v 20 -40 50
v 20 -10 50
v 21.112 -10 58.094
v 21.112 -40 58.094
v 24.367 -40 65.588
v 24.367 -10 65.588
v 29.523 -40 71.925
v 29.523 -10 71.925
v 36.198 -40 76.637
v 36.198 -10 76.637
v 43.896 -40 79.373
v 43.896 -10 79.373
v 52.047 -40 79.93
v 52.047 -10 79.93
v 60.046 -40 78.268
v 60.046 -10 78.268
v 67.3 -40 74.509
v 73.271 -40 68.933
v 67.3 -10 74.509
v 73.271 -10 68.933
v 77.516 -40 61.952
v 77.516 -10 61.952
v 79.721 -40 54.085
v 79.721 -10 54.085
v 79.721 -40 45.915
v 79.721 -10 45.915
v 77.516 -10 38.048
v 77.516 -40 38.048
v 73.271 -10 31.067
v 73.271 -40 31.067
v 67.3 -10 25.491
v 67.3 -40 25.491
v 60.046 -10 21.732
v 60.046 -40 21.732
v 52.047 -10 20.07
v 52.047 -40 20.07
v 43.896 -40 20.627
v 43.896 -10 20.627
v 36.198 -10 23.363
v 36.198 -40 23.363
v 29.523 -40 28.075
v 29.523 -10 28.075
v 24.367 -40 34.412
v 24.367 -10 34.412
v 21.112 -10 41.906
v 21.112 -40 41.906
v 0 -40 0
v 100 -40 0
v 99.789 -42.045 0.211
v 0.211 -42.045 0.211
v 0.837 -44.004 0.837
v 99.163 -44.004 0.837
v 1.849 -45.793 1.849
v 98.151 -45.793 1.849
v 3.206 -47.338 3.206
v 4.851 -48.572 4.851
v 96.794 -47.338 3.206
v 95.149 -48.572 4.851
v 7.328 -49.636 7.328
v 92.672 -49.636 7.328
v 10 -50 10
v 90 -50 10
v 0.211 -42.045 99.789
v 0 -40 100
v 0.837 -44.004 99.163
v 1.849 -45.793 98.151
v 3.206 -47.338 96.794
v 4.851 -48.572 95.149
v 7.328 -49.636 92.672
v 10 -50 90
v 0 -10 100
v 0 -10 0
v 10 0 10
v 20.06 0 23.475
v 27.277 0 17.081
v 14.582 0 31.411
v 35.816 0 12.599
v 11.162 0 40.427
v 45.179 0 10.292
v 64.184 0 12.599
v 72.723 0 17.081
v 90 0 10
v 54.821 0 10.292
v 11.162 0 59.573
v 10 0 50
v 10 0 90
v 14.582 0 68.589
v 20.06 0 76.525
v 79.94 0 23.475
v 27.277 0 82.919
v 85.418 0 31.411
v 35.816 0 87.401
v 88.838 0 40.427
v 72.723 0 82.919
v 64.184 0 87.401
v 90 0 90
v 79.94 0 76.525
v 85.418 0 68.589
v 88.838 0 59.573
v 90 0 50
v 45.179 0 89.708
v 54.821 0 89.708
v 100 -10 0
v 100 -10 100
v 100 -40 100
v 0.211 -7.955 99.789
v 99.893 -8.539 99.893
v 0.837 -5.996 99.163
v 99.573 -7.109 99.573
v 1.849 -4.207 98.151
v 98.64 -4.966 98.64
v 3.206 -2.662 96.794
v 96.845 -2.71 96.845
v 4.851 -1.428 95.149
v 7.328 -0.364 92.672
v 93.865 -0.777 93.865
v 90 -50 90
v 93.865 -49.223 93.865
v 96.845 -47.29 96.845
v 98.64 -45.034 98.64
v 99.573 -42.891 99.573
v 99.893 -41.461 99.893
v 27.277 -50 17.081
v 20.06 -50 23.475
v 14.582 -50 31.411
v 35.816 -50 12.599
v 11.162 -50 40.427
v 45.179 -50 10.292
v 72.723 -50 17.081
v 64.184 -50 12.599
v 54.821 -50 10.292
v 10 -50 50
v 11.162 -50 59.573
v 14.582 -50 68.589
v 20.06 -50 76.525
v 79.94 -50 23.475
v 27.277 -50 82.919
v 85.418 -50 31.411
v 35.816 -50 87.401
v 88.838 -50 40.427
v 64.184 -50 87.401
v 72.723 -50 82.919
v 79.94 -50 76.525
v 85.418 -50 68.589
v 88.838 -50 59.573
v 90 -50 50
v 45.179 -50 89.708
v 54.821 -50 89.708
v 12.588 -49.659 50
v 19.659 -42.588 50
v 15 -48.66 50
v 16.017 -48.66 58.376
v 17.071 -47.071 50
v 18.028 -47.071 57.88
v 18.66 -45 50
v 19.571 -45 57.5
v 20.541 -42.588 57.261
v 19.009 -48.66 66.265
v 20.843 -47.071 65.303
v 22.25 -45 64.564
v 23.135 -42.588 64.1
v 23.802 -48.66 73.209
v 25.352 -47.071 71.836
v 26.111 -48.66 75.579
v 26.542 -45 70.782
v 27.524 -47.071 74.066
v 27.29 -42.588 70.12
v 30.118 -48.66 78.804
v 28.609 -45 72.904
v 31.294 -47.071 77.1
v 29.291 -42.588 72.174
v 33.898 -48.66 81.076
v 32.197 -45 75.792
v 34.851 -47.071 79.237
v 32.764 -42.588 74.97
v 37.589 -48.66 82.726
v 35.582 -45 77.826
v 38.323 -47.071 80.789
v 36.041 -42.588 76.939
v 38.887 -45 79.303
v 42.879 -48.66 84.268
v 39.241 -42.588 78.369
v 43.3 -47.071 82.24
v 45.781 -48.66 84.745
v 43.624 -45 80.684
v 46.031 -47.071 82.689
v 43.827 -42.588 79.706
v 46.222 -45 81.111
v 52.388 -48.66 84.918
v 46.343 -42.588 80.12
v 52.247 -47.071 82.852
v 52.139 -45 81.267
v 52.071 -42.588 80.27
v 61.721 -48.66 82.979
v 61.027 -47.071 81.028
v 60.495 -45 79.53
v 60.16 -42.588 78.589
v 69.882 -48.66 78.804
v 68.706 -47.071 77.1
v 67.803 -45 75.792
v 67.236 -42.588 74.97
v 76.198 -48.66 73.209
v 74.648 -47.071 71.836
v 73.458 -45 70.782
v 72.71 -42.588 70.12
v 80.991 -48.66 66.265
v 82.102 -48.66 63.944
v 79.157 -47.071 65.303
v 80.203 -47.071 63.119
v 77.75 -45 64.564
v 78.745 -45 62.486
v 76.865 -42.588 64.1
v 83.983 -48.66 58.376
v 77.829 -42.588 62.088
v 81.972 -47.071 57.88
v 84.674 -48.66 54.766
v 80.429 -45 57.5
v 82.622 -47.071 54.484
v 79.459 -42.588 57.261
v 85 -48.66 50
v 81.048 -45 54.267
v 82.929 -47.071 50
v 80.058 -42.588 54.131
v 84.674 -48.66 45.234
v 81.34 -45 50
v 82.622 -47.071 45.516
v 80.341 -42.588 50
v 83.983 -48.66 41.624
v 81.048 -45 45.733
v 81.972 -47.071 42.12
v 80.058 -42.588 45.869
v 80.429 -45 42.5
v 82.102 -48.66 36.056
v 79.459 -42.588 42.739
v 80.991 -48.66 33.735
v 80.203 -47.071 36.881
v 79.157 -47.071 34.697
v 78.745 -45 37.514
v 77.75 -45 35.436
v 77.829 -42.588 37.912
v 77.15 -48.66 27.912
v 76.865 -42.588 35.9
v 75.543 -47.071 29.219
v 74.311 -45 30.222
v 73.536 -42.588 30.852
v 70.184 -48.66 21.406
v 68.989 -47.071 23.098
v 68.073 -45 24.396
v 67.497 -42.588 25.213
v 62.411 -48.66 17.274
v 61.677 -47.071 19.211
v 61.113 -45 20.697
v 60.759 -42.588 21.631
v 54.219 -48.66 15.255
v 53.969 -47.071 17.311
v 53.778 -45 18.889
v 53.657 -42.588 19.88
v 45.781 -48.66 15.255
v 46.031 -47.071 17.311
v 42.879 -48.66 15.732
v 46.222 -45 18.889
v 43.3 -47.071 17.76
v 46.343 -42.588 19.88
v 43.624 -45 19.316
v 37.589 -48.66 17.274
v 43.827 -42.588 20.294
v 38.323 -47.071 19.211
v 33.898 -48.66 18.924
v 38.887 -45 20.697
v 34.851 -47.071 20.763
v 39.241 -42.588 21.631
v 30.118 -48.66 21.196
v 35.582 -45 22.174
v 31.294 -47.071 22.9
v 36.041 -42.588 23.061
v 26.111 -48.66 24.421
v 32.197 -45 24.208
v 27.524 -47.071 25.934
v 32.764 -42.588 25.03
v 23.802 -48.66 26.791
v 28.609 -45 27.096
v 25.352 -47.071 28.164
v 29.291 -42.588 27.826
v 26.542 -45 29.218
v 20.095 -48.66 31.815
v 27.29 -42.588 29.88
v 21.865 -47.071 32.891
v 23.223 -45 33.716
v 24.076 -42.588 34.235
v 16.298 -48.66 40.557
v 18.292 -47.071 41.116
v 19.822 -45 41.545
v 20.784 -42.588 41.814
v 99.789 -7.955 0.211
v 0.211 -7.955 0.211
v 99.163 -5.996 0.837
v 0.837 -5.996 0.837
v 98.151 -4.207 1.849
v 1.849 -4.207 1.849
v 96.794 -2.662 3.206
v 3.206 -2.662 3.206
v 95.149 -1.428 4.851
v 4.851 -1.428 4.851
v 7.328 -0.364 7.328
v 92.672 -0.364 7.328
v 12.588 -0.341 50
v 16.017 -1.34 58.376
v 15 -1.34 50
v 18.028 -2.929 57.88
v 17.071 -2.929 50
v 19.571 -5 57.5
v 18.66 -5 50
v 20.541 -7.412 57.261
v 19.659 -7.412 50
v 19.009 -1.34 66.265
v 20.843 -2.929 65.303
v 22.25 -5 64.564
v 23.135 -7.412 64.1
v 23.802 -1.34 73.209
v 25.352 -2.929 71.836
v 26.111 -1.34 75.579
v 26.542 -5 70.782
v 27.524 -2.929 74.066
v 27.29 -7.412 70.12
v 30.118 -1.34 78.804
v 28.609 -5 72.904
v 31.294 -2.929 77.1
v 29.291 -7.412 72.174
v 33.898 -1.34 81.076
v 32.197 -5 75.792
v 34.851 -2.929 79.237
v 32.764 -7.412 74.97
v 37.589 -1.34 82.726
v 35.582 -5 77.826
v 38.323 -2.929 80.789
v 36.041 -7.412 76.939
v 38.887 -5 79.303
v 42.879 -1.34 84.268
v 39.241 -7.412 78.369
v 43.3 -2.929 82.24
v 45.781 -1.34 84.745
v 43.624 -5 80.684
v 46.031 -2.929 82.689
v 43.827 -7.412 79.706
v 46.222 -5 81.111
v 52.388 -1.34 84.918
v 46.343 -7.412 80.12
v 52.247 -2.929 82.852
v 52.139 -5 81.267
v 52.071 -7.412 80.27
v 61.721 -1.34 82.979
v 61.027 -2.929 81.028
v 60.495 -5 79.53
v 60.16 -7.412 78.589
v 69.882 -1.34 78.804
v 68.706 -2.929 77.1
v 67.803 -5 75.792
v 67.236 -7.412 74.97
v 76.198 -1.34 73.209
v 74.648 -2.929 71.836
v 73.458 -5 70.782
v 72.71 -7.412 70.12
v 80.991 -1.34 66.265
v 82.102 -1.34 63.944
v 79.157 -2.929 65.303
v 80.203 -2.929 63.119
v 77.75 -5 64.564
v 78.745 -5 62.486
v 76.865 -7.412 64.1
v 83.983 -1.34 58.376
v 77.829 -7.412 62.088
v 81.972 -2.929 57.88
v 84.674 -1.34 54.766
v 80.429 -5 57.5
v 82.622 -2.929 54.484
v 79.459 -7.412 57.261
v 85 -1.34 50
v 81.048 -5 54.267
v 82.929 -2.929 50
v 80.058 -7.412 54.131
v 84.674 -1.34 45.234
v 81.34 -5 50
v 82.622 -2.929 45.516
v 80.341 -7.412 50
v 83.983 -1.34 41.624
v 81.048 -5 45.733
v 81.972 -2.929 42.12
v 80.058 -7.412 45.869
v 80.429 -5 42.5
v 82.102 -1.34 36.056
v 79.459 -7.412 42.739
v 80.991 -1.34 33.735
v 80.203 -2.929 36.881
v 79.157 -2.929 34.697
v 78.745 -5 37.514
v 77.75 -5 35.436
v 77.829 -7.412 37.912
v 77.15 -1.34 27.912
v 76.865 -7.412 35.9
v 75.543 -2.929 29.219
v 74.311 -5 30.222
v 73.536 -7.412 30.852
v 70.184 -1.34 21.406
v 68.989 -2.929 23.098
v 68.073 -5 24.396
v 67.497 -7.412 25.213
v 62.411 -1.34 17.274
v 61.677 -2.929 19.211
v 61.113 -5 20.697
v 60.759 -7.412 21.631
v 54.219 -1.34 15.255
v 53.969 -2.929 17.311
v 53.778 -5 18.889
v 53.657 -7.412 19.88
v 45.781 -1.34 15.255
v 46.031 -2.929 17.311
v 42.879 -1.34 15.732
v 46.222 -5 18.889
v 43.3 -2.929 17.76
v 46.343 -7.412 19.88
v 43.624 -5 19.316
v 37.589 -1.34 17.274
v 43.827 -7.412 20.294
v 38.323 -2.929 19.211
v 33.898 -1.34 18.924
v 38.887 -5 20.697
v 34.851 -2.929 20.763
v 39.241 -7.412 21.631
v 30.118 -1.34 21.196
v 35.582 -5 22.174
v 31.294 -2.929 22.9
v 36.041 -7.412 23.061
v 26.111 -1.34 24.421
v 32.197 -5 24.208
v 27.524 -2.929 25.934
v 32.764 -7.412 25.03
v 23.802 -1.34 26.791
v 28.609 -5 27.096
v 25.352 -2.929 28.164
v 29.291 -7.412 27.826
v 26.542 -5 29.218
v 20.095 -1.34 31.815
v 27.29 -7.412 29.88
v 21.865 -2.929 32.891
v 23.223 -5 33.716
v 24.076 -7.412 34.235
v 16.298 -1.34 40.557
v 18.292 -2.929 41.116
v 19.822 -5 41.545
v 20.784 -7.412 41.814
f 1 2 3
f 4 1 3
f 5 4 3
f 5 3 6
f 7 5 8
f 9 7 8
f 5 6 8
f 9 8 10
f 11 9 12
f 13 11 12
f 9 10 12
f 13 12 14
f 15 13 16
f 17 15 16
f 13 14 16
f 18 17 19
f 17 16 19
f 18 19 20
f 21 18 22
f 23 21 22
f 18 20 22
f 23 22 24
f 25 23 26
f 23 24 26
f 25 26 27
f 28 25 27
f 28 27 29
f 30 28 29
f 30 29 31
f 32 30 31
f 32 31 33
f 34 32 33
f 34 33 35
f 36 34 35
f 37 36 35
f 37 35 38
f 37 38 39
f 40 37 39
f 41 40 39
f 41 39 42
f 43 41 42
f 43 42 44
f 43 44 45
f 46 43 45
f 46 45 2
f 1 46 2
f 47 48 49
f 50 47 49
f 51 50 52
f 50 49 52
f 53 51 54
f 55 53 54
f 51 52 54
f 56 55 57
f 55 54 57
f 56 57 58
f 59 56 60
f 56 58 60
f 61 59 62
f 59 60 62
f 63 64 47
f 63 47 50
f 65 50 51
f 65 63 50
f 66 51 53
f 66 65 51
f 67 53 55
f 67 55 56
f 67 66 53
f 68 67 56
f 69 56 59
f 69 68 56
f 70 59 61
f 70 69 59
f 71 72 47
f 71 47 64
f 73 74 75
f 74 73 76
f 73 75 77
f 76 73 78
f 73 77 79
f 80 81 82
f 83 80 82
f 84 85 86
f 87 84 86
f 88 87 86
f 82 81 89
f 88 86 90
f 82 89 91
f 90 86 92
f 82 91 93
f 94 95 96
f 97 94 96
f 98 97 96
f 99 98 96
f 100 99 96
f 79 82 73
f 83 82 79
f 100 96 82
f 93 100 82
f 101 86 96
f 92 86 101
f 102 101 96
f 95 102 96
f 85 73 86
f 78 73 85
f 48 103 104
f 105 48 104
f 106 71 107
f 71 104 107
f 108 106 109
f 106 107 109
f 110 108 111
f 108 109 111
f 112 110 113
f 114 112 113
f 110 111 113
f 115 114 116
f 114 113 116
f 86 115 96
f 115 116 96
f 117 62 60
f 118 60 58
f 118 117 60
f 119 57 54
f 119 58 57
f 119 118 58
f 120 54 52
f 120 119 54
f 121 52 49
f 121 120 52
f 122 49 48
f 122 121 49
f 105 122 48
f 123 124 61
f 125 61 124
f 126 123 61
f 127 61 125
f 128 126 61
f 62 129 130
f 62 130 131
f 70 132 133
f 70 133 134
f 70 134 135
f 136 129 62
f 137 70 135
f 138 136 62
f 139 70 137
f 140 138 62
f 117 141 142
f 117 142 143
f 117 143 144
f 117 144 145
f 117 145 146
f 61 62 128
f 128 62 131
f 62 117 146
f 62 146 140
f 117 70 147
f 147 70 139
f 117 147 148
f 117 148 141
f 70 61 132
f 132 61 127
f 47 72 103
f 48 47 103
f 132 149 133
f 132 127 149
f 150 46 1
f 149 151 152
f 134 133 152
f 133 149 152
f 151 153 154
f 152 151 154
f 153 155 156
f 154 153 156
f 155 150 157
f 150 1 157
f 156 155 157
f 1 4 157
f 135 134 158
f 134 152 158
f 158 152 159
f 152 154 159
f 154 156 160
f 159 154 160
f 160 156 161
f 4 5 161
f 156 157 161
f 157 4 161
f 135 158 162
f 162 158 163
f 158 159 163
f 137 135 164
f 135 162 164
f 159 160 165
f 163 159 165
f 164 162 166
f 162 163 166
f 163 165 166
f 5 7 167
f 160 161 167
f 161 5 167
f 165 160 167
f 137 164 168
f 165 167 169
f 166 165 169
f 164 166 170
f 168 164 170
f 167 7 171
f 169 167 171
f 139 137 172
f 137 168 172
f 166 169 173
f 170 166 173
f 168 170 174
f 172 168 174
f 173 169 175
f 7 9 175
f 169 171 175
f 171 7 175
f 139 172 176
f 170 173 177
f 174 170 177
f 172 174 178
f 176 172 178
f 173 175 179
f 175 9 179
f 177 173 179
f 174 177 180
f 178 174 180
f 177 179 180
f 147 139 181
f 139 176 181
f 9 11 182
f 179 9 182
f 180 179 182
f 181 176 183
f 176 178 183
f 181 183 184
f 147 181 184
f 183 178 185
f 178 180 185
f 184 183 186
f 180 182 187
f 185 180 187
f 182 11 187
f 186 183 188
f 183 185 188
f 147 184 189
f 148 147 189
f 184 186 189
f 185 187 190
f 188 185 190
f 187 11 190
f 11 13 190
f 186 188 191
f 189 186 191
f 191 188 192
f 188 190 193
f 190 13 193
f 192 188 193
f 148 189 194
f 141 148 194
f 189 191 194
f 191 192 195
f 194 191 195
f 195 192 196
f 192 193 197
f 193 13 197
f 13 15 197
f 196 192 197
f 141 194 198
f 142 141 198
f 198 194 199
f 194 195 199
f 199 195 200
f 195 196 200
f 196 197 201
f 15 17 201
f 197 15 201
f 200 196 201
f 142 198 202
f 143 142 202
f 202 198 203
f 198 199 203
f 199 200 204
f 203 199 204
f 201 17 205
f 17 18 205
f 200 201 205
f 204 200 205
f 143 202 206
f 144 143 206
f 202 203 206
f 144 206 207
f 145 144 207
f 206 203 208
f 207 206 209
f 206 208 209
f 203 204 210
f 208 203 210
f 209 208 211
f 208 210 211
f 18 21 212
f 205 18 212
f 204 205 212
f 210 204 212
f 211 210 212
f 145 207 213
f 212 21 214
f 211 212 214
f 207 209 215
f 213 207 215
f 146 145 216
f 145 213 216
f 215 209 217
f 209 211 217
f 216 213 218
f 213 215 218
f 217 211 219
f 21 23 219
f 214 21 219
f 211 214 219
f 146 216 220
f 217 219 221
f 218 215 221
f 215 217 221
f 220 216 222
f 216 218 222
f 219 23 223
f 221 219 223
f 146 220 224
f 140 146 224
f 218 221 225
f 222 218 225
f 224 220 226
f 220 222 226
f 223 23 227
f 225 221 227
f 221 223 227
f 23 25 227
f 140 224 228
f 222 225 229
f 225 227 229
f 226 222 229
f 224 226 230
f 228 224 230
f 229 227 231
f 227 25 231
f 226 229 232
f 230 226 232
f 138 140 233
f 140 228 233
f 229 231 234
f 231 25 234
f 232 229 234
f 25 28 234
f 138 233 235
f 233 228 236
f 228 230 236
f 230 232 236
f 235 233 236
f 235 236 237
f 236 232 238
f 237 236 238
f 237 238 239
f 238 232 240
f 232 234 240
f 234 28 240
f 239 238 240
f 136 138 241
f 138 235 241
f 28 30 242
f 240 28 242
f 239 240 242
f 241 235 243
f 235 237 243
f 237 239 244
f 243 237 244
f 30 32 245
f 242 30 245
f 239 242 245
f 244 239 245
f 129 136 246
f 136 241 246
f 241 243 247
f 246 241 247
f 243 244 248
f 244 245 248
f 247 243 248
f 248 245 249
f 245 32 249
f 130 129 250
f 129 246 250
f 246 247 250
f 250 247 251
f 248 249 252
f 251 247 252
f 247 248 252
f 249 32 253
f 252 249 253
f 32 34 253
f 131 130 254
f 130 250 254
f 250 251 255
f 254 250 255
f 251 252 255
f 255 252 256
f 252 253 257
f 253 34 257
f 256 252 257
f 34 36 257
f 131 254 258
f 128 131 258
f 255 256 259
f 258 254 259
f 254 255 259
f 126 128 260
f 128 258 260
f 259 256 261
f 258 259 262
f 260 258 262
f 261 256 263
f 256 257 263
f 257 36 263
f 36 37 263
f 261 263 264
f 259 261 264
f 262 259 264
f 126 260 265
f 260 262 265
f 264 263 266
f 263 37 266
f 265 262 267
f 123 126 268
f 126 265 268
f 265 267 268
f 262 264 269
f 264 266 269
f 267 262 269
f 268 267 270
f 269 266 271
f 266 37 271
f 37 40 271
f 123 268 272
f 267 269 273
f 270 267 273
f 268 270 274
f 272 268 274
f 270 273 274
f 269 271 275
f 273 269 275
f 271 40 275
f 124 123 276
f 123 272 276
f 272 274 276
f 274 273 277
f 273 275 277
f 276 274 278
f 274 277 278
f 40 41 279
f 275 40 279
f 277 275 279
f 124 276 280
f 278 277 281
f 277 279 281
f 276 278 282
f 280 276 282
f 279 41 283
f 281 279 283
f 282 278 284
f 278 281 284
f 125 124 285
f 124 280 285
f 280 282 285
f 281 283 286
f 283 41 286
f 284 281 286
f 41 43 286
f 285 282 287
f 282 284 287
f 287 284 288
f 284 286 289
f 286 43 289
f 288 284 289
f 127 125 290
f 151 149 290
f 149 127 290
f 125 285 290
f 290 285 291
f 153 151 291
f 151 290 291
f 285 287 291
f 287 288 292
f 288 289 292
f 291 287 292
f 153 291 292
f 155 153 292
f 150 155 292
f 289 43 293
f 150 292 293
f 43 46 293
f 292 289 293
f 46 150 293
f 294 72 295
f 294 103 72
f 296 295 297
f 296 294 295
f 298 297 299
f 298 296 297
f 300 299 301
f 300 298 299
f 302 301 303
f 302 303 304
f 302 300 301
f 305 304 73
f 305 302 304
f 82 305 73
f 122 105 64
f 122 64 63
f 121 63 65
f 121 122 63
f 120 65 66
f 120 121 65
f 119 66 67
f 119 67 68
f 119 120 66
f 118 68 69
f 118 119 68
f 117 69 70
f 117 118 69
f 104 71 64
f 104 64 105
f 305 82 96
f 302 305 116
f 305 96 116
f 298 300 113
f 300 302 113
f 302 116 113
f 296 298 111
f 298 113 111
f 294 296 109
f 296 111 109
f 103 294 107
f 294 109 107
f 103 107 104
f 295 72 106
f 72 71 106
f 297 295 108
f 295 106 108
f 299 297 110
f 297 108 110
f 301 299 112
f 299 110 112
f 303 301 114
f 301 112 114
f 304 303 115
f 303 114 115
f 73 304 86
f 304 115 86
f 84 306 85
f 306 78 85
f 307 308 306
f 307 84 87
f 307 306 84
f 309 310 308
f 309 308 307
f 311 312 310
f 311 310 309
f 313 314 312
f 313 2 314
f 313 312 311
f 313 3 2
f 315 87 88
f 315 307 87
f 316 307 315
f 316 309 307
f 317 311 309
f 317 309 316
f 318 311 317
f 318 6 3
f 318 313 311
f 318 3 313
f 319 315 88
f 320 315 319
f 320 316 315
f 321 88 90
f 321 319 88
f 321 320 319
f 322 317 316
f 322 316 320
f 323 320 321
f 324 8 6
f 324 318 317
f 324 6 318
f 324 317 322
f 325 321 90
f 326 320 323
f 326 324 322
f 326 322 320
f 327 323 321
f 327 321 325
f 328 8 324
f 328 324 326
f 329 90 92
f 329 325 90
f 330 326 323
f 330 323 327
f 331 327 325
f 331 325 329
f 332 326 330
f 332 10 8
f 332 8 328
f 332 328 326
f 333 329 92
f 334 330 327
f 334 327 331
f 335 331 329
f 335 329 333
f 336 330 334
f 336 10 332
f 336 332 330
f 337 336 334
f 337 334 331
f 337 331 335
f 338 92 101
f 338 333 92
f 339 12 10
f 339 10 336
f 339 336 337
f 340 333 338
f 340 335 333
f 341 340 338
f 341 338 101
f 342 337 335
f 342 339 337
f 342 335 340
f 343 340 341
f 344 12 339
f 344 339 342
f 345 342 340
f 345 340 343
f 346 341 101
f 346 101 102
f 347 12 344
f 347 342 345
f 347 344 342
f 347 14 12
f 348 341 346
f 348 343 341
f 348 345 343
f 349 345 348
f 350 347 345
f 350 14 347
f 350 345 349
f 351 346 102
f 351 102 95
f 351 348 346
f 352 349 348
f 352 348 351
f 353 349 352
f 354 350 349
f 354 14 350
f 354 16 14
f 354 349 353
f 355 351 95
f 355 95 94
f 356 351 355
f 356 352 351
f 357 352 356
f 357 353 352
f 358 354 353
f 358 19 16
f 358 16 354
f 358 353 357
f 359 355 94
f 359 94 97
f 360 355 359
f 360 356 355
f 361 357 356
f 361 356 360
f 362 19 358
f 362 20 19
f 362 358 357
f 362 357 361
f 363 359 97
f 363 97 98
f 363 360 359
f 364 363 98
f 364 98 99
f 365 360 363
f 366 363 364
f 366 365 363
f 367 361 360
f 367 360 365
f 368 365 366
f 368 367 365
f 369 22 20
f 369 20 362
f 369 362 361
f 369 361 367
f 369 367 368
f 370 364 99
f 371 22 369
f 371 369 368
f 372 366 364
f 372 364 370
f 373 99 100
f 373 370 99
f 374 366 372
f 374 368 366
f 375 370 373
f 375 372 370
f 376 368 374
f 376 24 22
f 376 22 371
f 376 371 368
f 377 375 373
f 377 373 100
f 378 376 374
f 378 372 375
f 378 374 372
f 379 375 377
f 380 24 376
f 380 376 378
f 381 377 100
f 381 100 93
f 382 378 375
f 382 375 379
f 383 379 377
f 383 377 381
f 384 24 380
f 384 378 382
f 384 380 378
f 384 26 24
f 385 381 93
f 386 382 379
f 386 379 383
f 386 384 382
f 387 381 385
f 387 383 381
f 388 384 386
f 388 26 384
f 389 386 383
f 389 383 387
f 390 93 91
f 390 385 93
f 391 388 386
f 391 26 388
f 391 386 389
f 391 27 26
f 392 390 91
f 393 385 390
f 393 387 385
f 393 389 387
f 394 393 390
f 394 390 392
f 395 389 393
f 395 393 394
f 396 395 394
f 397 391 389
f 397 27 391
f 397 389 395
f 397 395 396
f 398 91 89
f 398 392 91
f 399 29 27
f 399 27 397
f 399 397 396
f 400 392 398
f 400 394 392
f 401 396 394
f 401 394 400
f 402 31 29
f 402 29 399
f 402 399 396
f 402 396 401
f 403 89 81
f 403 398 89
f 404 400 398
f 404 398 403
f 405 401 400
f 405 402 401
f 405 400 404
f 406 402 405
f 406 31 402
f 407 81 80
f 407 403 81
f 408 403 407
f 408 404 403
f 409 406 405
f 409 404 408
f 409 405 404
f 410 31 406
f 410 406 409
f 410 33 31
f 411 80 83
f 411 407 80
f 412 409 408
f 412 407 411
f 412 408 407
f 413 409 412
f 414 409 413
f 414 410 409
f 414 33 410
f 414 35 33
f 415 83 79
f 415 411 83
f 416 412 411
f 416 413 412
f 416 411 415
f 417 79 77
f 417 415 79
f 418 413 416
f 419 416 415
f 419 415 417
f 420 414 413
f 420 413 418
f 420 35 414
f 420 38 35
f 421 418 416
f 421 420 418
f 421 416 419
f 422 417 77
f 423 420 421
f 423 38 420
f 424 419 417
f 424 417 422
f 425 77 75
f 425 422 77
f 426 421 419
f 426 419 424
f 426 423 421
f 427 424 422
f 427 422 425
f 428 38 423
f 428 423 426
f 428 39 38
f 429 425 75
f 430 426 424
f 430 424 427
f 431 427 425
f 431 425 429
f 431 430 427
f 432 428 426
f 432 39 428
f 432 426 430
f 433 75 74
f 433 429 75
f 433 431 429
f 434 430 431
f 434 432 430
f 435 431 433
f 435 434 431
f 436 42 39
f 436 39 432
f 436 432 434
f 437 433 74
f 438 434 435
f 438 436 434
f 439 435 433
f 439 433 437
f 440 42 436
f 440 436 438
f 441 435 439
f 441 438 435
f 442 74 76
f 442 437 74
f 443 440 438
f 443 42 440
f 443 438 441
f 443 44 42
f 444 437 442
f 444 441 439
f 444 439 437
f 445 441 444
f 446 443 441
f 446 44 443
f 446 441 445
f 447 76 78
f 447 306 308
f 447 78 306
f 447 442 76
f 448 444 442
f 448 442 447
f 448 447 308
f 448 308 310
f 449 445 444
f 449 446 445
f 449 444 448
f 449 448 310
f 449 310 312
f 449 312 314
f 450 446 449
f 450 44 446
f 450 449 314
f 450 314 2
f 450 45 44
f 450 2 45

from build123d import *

# Parameters (mm, degrees)
F0_W     = 100
F0_H     = 100
F1_DEPTH = 50
F3_D     = 60
F4_R     = 9.99999


# Not quite as in the source:
# - a fillet or chamfer is up to 0.001 mm smaller than in the source, because OpenCascade refuses the exact size


with BuildPart() as f1:
    # F0 (on Front) → F1 (new body)
    with BuildSketch(Plane.XZ):
        with Locations((50, 50)):
            Rectangle(F0_W, F0_H)
    extrude(amount=F1_DEPTH)

    # F3 (through all)
    with Locations(Plane.XZ.offset(50)):
        with Locations((50, 50)):
            Hole(F3_D / 2)

    # F4 (radius 10 in the source; OpenCascade refuses exactly that, so slightly less here)
    f4_edges = [f1.edges().sort_by_distance(p)[0] for p in [
        (50, -50, 0),
        (0, -50, 50),
        (100, -50, 50),
        (50, -50, 100),
        (20, -50, 50),
        (50, 0, 0),
        (0, 0, 50),
        (100, 0, 50),
        (50, 0, 100),
        (20, 0, 50),
    ]]
    fillet(f4_edges, radius=F4_R)


solid = f1.part
